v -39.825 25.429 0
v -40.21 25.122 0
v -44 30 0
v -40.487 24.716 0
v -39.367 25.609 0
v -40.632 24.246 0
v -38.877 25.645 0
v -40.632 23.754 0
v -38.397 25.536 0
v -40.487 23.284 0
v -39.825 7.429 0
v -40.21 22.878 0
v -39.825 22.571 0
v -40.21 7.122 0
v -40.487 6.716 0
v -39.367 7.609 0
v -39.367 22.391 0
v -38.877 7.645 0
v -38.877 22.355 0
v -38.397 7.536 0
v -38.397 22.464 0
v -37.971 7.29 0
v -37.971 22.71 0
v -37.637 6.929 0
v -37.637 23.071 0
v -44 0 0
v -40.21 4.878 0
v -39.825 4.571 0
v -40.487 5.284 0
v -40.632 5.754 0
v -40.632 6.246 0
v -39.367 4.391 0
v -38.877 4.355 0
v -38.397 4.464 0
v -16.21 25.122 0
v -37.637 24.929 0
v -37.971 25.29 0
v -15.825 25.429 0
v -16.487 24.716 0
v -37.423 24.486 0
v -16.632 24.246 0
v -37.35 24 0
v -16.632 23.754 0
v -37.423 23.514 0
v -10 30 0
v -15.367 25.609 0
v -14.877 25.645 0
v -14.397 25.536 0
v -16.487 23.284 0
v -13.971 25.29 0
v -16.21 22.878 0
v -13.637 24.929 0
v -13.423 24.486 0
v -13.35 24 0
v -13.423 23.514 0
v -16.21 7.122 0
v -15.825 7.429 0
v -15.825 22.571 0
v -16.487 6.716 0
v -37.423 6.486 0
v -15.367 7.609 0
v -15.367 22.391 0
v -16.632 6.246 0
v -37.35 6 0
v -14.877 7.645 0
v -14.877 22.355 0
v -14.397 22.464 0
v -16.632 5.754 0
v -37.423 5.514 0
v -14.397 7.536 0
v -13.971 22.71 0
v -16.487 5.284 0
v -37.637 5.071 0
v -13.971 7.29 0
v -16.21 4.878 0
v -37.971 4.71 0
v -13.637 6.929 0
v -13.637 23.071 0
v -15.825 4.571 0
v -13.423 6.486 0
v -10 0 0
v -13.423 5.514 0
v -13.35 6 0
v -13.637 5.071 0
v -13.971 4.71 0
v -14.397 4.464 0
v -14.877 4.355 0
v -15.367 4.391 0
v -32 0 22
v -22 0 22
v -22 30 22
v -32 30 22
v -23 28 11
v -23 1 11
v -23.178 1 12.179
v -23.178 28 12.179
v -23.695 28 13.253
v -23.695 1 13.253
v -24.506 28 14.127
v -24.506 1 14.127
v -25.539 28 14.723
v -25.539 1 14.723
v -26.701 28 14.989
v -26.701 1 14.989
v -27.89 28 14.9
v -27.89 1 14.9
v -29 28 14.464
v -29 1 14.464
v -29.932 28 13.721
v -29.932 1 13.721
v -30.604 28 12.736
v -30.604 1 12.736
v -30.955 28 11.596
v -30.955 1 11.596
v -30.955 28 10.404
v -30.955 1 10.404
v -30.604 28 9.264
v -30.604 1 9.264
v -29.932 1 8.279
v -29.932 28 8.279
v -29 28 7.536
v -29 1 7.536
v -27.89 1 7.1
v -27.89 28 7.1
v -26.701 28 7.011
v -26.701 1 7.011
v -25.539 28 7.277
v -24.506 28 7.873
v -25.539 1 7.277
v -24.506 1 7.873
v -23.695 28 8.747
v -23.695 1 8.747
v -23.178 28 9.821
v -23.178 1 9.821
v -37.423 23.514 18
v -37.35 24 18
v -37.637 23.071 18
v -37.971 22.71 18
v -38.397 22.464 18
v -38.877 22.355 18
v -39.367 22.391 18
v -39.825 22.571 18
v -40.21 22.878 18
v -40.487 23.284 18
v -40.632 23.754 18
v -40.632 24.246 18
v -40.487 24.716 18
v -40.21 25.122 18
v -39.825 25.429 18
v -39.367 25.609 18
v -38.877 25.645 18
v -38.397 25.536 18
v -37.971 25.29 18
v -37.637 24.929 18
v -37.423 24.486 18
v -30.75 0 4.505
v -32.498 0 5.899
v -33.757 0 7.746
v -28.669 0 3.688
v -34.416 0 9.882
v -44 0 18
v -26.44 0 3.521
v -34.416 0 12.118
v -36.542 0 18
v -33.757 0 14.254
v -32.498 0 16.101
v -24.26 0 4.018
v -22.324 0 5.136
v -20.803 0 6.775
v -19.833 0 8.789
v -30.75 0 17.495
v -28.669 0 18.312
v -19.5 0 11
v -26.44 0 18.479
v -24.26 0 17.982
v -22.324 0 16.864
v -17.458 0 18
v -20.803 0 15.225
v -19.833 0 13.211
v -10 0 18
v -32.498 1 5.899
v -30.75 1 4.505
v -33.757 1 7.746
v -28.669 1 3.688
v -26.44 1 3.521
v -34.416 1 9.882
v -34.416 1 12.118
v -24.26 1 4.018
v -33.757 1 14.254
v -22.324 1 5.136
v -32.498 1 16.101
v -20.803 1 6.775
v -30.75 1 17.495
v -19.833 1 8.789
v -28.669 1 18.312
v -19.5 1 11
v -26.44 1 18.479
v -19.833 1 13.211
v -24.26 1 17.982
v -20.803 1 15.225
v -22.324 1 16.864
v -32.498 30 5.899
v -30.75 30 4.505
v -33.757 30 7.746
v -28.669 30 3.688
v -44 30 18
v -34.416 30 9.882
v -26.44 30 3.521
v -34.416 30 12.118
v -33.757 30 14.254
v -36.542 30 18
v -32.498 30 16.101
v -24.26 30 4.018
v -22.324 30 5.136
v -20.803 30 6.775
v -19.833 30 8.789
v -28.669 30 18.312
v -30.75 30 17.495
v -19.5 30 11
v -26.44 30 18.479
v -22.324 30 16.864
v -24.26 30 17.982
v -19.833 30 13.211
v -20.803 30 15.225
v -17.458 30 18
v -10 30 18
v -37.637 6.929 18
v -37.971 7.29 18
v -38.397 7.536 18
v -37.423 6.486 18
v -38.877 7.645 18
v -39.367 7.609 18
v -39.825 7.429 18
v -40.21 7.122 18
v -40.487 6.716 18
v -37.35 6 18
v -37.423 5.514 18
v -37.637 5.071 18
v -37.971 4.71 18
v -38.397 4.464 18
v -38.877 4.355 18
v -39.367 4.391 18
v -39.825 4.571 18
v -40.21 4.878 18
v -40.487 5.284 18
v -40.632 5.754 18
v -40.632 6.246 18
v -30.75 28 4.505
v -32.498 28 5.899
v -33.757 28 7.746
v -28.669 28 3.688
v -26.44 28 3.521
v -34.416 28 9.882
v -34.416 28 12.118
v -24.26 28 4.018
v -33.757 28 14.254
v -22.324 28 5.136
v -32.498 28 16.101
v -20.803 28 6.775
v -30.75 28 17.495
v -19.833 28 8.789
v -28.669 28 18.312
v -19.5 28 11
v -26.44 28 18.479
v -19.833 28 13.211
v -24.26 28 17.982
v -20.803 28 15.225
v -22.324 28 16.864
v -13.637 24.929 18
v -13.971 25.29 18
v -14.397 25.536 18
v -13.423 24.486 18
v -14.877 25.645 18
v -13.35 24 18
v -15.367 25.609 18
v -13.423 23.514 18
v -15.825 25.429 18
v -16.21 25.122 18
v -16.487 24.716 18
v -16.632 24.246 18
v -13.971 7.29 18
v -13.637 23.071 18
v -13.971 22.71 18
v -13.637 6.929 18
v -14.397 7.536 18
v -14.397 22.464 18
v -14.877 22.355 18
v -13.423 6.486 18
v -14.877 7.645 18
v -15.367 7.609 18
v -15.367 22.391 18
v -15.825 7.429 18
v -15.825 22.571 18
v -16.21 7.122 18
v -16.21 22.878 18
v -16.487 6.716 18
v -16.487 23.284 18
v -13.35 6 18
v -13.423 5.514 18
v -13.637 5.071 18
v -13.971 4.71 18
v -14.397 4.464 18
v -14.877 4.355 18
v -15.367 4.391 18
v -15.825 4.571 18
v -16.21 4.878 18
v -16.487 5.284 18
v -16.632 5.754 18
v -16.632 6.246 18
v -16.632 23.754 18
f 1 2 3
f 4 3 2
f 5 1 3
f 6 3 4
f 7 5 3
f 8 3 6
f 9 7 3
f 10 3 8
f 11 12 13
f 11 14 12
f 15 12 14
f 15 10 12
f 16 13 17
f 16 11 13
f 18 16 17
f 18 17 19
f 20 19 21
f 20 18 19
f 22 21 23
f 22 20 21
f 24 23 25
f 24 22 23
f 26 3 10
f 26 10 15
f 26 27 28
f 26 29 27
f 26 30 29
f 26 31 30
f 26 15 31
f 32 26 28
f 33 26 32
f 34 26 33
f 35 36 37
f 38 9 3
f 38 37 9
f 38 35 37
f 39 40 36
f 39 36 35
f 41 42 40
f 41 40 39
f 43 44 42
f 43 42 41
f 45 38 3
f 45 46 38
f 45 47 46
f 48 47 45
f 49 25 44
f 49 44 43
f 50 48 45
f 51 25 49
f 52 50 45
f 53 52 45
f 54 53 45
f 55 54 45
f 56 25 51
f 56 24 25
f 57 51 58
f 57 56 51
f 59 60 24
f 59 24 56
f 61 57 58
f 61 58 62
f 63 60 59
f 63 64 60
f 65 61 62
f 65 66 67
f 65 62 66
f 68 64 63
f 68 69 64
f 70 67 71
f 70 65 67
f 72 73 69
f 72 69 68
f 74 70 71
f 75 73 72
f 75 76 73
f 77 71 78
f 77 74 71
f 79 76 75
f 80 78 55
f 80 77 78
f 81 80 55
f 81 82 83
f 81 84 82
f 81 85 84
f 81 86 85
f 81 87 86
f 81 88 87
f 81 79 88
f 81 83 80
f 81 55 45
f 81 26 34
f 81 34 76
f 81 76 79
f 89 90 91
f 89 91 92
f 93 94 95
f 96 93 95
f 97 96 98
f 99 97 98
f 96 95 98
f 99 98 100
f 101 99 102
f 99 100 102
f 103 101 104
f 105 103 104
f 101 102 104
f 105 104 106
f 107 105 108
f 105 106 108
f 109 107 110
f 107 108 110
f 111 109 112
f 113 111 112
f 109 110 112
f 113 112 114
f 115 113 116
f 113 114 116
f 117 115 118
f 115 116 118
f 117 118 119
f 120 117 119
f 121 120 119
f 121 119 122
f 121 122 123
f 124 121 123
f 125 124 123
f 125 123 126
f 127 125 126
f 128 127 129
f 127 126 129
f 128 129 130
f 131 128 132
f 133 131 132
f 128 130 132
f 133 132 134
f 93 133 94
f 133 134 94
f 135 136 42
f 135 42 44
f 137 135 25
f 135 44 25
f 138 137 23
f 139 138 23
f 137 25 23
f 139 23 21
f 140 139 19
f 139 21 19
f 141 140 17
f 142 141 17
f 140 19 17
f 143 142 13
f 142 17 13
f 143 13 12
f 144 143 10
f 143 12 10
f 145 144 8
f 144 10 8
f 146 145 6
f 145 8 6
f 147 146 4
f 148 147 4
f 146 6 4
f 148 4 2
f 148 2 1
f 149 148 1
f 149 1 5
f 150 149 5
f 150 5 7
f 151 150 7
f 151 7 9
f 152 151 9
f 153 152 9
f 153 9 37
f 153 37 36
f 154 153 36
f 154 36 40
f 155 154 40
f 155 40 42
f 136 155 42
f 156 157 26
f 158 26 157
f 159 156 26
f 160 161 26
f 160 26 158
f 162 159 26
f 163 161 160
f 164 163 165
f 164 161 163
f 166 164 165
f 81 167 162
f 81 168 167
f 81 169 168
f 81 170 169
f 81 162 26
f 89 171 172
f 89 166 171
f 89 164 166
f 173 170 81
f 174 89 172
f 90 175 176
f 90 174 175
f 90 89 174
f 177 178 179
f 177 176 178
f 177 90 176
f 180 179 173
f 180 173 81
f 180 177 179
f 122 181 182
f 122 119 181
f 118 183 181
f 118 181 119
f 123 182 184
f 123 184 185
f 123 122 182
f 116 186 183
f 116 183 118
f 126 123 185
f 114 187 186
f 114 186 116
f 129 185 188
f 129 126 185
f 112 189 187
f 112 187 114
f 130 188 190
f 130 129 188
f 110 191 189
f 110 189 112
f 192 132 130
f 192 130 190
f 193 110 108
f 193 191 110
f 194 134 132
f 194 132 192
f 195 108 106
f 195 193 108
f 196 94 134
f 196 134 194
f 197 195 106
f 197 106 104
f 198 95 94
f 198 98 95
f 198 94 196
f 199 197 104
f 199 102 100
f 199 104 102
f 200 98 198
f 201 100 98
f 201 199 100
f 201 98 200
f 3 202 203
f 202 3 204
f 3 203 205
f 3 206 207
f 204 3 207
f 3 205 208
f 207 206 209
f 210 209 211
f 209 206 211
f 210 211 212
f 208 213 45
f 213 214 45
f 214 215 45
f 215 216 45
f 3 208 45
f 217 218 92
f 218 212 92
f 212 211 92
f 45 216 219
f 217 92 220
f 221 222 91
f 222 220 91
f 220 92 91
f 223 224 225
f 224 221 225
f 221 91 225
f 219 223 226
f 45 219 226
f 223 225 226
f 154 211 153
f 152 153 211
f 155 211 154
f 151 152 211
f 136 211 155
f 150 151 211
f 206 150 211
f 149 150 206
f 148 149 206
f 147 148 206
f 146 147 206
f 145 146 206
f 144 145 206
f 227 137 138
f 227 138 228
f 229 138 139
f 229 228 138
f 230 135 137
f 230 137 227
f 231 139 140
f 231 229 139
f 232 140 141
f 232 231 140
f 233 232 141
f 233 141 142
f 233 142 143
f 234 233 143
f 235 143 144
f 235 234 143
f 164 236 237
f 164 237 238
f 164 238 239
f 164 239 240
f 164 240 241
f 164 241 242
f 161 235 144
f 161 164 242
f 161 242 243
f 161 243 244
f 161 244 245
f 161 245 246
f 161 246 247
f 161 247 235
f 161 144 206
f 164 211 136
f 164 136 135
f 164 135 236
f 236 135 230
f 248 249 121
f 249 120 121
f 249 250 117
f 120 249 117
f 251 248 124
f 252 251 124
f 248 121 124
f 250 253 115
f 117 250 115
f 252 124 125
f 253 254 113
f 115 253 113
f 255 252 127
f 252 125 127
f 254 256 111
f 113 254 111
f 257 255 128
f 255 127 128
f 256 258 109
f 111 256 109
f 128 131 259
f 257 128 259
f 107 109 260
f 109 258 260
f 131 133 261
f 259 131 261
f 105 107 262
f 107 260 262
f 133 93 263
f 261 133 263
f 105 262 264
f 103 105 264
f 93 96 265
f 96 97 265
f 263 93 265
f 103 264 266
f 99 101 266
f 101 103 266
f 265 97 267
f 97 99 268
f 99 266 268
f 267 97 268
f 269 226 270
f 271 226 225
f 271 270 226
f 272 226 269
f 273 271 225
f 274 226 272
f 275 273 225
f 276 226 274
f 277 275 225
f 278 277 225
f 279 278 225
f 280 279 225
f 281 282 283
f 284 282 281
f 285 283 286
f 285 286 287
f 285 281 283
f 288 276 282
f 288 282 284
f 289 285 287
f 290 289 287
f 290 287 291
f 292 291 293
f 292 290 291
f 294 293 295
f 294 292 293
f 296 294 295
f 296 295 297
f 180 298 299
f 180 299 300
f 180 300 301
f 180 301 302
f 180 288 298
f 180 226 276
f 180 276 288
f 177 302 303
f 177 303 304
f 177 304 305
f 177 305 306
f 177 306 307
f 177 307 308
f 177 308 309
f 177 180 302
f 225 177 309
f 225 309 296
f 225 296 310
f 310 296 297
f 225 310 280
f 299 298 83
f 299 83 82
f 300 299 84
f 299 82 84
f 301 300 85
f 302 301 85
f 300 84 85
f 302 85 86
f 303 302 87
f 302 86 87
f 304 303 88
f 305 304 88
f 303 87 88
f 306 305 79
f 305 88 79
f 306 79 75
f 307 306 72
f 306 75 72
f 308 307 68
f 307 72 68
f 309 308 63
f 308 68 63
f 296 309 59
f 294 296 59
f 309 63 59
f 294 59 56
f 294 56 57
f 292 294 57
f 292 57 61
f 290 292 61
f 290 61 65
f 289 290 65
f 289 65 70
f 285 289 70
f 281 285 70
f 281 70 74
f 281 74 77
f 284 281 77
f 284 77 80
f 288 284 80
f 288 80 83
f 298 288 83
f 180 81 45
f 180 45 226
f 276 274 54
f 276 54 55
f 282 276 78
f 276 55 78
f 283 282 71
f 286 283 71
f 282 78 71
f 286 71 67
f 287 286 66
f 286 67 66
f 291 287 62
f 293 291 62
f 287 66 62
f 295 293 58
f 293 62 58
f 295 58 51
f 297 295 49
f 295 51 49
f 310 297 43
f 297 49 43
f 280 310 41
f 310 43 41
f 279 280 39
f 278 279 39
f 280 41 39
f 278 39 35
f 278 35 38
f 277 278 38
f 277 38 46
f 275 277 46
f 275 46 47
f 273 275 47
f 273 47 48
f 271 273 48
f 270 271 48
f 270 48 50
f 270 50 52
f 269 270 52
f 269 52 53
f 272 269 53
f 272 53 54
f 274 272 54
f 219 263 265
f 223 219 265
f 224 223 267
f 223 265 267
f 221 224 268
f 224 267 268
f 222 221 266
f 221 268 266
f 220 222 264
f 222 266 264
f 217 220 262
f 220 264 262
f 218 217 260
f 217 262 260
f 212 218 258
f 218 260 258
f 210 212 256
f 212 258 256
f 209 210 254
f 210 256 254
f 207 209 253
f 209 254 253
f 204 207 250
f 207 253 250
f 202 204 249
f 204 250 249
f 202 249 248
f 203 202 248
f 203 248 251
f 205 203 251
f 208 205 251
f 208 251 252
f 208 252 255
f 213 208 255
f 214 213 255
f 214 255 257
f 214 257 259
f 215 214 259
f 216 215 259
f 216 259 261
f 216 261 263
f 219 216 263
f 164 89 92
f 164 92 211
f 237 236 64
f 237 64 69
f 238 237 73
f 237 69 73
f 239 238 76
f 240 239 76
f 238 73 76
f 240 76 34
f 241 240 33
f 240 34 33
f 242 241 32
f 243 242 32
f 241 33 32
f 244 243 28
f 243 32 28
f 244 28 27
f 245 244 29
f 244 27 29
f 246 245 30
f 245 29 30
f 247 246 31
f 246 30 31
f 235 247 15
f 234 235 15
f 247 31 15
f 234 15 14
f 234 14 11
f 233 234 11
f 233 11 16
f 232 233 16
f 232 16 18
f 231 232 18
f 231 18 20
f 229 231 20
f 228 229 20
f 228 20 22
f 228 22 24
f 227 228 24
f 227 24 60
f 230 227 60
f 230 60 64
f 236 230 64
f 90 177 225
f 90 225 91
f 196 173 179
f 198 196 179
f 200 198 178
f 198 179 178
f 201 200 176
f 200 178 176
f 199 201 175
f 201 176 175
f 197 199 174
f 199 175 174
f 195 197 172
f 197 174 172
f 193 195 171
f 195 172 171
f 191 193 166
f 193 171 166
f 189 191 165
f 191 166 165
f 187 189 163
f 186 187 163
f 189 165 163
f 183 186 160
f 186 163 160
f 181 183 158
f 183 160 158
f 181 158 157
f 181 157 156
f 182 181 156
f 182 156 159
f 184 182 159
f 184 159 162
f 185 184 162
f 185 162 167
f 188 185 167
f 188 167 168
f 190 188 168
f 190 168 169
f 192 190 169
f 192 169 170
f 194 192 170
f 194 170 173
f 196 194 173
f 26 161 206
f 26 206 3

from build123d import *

# Parameters (mm, degrees)
F0_R     = 7.5
F1_DEPTH = 30
F2_START = -1
F0_R_2   = 4
F2_DEPTH = 27
F3_R     = 1.65
F4_DEPTH = 25


with BuildPart() as f1:
    # F0 (on Front) → F1 (new body)
    with BuildSketch(Plane.XZ):
        Polygon((-44, 18), (-44, 0), (-10, 0), (-10, 18), (-17.4580022789, 18), (-22, 22), (-32, 22), (-36.5419977211, 18), align=None)
        with Locations((-27, 11)):
            Circle(F0_R, mode=Mode.SUBTRACT)
    extrude(amount=-F1_DEPTH)

    # F0 (on Front) → F2 (join)
    with BuildSketch(Plane.XZ.offset(F2_START)):
        with Locations((-27, 11)):
            Circle(F0_R)
        with Locations((-27, 11)):
            Circle(F0_R_2, mode=Mode.SUBTRACT)
    extrude(amount=-F2_DEPTH)

    # F3 (on face) → F4 (cut)
    with BuildSketch(Plane(origin=(0, 0, 0), x_dir=(1, 0, 0), z_dir=(0, 0, -1))):
        with Locations((-39, -6)):
            Circle(F3_R)
        with Locations((-15, -6)):
            Circle(F3_R)
        with Locations((-15, -24)):
            Circle(F3_R)
        with Locations((-39, -24)):
            Circle(F3_R)
    extrude(amount=-F4_DEPTH, mode=Mode.SUBTRACT)


solid = f1.part
